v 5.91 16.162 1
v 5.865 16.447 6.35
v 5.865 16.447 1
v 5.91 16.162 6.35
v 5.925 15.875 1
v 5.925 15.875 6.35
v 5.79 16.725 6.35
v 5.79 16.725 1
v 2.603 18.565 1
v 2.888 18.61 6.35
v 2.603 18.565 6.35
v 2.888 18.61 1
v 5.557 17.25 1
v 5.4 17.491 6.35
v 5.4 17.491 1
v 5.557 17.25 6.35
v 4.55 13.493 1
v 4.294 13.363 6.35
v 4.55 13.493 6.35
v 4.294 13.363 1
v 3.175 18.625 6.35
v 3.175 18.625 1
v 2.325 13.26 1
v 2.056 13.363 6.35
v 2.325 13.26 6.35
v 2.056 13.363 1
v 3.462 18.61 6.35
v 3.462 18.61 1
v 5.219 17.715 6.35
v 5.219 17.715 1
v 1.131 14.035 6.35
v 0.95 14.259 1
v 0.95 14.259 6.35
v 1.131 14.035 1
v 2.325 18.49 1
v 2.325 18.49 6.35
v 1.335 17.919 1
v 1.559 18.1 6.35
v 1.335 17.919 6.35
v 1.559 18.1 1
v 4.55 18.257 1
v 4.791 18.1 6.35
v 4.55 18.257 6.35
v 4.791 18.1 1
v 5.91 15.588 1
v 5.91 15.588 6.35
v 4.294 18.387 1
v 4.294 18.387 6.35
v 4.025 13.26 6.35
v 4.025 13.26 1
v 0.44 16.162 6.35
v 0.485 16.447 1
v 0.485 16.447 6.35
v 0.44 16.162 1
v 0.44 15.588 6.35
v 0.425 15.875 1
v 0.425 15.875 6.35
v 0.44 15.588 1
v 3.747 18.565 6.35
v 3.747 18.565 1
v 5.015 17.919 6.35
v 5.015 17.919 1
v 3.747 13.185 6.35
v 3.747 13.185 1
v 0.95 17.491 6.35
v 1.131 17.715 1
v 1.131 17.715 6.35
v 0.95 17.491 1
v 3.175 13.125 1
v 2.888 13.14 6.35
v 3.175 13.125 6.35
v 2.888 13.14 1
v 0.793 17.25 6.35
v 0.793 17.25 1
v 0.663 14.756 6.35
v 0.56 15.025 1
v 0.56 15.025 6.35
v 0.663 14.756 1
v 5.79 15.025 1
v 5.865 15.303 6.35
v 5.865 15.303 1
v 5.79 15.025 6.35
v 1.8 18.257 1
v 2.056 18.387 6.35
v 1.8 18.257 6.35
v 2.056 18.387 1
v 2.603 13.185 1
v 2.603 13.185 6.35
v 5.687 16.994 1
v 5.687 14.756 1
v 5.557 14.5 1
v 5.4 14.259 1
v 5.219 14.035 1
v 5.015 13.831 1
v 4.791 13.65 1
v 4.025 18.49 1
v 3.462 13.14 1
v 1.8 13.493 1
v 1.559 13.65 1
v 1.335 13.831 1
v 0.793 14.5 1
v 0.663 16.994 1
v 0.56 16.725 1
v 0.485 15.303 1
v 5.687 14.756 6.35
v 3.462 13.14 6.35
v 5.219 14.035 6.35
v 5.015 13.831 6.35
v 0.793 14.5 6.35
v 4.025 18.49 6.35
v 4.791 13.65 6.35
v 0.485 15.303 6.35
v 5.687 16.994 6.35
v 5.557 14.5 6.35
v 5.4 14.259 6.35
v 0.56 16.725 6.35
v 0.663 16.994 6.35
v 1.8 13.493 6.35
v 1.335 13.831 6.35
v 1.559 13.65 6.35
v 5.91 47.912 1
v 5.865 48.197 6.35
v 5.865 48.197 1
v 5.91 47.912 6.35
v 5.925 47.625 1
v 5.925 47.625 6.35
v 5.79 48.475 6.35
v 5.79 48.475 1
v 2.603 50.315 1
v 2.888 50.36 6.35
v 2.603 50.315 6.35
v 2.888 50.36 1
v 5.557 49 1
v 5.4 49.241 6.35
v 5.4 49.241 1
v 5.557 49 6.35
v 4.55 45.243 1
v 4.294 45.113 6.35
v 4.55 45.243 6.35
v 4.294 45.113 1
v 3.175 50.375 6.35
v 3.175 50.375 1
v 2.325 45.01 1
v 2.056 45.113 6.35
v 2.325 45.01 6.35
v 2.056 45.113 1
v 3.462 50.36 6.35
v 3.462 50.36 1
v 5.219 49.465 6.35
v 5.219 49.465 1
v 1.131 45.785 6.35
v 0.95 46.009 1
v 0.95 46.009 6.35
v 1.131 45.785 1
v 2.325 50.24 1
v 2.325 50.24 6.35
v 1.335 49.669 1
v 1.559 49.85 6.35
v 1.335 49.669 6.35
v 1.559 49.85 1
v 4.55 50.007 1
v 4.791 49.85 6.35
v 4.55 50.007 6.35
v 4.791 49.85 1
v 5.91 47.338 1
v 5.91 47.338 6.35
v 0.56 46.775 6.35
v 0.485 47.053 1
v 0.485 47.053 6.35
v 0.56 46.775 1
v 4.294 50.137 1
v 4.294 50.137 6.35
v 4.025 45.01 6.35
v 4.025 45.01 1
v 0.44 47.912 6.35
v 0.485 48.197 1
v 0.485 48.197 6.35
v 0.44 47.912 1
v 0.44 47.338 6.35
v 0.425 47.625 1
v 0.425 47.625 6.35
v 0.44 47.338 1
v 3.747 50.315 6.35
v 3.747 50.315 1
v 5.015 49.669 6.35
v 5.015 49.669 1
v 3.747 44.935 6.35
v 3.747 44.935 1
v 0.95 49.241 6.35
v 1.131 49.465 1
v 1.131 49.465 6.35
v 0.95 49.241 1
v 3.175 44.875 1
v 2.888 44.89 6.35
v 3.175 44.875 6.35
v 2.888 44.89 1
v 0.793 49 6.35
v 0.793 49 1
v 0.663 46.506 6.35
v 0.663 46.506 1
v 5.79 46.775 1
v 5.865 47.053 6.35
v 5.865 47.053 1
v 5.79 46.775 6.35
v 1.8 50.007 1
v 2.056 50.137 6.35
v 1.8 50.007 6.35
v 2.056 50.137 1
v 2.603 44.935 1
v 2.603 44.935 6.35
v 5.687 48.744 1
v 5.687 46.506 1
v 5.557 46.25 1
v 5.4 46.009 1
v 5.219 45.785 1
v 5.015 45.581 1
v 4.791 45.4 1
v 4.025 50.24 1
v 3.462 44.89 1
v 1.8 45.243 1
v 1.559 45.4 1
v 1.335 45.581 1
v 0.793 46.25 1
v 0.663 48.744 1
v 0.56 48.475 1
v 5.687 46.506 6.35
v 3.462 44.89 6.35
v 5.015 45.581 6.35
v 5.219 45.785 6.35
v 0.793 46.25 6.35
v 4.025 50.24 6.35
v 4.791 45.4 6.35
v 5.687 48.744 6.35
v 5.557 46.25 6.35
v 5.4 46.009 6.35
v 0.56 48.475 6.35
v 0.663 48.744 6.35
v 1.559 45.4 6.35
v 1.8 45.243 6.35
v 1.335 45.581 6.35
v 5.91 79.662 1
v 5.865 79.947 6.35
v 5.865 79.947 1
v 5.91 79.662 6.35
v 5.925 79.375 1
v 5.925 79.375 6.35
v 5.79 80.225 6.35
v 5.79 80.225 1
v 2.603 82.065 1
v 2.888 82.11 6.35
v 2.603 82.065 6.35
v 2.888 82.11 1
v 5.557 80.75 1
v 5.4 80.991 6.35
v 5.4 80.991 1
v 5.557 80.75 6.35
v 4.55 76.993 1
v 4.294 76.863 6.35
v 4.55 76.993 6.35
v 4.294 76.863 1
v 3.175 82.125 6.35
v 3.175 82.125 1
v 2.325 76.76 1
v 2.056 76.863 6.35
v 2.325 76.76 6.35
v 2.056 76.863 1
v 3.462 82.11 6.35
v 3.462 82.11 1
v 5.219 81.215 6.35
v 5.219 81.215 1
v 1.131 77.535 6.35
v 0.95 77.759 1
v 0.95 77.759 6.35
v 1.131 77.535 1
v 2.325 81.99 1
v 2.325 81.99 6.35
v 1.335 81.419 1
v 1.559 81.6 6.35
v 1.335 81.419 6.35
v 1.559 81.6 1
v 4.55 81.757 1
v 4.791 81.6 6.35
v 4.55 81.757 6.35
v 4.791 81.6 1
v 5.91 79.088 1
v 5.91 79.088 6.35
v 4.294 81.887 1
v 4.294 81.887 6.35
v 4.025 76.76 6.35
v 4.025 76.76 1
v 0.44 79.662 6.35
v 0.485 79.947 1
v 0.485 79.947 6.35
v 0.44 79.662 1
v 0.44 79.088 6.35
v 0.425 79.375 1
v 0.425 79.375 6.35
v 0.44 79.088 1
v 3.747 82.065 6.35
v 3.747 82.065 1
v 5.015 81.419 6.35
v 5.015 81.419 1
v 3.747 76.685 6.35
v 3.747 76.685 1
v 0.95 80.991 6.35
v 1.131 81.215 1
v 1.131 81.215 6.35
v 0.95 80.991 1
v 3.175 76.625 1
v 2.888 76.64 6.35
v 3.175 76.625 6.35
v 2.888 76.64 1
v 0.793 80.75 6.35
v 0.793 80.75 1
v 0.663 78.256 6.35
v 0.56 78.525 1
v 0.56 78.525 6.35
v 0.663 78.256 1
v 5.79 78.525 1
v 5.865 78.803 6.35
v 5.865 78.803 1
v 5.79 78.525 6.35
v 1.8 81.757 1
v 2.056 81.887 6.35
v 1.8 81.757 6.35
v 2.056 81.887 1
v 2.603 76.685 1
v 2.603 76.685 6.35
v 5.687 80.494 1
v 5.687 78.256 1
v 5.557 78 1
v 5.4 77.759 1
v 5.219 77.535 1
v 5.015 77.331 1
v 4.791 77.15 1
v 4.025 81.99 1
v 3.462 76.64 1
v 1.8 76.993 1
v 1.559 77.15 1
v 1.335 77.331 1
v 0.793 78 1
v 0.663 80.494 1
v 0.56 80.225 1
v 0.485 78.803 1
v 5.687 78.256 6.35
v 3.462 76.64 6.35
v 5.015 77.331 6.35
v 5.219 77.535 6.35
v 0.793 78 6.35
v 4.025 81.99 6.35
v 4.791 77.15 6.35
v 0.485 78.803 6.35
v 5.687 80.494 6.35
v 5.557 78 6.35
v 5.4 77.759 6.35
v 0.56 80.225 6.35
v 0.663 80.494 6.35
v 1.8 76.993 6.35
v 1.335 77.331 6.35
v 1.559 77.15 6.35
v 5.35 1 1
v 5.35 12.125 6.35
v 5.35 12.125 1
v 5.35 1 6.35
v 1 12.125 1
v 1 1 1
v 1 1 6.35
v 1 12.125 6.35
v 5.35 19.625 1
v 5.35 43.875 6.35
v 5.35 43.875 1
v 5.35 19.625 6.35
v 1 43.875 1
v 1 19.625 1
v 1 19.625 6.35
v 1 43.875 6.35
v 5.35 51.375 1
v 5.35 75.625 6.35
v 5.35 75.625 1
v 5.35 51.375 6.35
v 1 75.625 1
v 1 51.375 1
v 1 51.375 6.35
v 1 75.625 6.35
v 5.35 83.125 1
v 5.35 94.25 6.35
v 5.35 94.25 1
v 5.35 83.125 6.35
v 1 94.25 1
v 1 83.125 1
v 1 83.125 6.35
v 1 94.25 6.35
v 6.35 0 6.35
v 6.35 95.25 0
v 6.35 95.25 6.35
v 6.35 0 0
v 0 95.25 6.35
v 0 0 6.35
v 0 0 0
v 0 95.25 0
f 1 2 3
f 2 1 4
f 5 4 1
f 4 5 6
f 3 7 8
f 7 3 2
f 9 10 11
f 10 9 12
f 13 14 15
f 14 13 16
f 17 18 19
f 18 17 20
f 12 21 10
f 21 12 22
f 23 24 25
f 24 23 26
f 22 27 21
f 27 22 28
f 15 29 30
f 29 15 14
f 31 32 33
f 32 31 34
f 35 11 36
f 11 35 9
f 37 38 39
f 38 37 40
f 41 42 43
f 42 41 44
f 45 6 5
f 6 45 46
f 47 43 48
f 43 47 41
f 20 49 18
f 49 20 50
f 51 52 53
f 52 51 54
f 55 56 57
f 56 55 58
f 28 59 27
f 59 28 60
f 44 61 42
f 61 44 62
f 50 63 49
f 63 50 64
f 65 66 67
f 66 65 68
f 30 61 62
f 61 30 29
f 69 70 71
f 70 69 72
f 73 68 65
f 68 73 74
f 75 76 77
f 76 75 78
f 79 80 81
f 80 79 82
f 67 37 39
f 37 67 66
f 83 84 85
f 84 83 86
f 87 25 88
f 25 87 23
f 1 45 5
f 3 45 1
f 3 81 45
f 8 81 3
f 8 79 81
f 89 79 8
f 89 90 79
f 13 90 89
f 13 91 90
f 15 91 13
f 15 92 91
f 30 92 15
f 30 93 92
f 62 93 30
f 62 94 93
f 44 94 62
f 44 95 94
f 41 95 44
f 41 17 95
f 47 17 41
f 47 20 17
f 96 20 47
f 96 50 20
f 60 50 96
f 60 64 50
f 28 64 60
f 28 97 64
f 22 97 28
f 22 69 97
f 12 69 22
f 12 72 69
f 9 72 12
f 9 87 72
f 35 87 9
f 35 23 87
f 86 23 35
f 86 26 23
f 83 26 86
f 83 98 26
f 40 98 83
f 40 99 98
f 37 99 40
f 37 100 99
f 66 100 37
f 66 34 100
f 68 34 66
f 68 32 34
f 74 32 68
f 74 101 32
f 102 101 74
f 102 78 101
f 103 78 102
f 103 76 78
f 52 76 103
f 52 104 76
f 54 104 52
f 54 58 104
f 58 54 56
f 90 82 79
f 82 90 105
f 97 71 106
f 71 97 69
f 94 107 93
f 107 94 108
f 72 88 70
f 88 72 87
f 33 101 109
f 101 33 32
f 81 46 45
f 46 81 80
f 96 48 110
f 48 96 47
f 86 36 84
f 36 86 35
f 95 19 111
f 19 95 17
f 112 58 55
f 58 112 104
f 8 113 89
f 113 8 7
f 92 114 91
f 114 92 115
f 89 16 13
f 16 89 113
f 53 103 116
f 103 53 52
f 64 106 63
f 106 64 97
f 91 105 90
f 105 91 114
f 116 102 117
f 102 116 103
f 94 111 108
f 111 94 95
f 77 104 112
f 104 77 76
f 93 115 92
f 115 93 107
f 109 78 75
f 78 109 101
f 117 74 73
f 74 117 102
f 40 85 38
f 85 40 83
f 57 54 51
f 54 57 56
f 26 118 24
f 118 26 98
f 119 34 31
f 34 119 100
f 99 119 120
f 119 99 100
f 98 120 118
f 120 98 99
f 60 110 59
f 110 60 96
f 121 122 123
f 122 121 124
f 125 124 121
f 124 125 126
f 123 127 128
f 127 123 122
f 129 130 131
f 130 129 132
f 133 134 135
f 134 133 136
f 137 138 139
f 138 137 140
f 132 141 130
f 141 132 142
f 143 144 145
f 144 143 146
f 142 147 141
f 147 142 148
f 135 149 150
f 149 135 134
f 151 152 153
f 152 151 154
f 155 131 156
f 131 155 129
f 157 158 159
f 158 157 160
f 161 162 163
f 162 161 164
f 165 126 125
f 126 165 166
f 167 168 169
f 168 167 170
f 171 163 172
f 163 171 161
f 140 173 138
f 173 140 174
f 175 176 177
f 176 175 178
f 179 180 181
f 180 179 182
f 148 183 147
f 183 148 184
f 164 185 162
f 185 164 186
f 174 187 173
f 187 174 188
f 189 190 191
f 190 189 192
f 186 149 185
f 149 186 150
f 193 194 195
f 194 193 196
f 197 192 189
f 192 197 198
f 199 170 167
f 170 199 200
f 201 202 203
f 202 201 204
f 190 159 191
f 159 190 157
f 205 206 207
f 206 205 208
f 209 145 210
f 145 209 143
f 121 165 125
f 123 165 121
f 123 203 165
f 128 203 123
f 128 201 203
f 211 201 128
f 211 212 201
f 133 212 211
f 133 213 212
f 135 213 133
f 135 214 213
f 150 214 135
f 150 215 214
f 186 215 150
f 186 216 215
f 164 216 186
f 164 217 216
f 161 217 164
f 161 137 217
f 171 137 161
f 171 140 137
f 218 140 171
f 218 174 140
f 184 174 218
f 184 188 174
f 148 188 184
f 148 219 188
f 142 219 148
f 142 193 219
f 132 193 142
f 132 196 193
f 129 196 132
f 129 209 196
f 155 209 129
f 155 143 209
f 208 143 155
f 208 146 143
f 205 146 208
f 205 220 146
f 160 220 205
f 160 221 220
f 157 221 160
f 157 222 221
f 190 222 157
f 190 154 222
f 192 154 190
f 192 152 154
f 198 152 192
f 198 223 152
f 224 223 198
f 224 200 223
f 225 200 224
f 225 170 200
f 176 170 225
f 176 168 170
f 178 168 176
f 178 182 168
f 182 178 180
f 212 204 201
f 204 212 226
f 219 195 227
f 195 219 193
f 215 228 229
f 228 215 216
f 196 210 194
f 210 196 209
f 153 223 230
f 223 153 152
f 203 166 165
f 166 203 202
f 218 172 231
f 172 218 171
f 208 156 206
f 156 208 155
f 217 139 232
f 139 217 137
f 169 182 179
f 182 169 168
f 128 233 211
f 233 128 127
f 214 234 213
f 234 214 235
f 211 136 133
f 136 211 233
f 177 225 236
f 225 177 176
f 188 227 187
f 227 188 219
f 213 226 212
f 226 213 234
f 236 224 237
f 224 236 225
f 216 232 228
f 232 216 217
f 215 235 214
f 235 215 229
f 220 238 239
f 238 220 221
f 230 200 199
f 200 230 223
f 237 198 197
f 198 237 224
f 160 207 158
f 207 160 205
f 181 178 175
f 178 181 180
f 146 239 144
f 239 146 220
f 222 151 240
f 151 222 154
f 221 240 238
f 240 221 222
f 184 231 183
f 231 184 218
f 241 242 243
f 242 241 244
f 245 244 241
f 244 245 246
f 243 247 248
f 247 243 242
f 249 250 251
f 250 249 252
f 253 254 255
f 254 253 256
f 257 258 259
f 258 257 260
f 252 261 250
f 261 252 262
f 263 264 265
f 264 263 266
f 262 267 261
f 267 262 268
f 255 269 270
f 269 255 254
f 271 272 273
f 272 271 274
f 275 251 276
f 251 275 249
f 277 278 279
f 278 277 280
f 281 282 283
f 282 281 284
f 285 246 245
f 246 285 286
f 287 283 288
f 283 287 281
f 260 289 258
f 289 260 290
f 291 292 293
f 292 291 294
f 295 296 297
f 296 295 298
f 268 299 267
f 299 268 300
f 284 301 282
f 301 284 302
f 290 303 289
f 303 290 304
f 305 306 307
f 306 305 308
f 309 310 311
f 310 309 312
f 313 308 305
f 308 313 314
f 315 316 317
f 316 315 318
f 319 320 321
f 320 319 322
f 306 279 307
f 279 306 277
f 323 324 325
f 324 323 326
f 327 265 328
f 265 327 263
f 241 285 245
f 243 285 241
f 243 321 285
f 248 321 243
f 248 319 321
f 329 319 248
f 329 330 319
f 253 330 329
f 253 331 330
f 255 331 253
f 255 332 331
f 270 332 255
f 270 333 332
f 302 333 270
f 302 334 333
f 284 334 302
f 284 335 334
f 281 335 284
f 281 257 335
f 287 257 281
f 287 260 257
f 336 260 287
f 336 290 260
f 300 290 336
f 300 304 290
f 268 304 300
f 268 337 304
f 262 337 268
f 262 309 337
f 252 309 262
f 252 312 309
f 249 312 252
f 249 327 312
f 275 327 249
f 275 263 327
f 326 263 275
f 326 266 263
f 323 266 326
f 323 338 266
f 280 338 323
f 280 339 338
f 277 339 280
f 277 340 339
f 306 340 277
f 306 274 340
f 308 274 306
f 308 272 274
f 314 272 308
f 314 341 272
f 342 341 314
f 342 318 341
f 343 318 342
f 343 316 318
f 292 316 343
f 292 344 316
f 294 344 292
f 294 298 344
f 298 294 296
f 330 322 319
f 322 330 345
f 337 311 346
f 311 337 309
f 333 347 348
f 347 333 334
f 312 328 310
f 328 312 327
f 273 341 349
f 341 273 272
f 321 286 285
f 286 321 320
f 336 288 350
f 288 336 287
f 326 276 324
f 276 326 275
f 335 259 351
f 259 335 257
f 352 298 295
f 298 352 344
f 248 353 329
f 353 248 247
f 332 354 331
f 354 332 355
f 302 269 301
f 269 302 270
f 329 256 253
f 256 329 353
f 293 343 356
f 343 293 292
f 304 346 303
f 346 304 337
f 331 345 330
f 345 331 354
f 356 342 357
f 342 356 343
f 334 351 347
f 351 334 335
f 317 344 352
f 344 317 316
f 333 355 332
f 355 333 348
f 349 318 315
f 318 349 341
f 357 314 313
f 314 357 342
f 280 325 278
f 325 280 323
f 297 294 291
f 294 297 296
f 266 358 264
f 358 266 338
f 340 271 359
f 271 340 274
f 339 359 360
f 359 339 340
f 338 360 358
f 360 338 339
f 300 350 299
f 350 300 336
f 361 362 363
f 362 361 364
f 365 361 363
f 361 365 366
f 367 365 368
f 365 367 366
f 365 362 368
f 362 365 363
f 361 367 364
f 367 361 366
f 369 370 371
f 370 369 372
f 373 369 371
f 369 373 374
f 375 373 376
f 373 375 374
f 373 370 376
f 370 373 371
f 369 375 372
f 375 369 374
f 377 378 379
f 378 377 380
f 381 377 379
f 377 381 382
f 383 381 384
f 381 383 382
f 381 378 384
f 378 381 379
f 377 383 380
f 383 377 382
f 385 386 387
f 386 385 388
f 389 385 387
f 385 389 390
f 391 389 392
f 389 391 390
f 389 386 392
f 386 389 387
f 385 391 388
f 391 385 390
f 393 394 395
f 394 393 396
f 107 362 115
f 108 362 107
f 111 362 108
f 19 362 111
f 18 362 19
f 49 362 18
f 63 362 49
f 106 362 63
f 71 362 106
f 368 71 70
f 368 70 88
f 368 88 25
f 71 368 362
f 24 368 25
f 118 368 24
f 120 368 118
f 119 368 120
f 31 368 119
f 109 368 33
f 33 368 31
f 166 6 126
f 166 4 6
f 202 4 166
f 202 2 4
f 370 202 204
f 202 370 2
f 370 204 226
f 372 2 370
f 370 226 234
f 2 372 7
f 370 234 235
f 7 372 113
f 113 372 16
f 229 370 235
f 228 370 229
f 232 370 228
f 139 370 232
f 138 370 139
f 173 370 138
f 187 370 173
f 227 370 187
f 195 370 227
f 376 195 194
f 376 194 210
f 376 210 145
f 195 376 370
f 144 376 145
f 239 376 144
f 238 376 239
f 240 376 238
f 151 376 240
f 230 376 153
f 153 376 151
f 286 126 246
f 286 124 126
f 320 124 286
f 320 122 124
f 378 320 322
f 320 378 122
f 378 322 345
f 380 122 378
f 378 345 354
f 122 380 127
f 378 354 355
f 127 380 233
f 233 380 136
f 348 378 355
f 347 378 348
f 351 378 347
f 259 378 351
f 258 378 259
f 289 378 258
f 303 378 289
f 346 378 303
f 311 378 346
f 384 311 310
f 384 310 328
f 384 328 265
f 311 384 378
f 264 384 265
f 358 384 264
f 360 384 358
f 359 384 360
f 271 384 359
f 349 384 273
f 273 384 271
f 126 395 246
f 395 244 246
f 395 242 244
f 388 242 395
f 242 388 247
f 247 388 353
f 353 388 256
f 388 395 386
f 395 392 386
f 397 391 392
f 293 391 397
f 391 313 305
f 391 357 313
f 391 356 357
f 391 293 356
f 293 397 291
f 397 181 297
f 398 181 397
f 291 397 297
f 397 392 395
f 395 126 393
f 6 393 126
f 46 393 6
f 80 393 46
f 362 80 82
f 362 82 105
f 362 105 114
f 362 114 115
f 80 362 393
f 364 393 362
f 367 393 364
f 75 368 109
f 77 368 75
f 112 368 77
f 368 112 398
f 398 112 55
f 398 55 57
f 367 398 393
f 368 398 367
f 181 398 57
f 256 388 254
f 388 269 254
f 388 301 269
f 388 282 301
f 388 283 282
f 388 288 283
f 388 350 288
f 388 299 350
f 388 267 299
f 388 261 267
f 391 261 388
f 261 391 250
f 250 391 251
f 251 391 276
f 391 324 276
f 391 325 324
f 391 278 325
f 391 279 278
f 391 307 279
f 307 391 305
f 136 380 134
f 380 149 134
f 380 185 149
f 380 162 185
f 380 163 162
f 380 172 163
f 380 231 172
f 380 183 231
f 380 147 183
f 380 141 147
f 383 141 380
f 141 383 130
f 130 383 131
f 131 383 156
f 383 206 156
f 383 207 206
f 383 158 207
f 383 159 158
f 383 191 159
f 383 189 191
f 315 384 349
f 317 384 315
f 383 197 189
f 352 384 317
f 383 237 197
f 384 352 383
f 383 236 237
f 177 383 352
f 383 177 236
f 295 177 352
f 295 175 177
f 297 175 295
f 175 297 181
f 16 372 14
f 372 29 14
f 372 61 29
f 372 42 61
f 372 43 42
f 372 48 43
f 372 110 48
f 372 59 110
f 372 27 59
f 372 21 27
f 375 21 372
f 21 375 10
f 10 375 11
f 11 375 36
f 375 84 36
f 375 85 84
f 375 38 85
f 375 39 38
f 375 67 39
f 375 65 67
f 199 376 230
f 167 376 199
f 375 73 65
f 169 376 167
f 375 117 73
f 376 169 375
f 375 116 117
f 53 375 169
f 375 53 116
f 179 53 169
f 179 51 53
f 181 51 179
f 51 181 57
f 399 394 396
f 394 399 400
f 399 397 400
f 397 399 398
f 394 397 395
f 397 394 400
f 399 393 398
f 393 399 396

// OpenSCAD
// Number of faces
$fn=60;

// Inch to mm, makes it easier to read than 19.05mm == 0.75in
inch = 25.4;



// Magnet hole diameter
magnet_diameter = 5.5;

// Tile dimensions (TT=1.25, OpenLock=1)
tile_size = 1.25*inch;

// Length of the strip in tiles
tile_count = 3;

// Strip width (TT assumes 0.25in walls)
strip_width = 0.25*inch;

// Strip Height
strip_height = 0.25*inch;

// How much space to leave at the bottom of the magnet hole
magnet_hole_bottom_offset = 1;

// Whether to hollow the strip as much as possible
hollow = true;

// x y z

difference(){
    cube([strip_width, tile_size * tile_count, strip_height]);
    for (i = [0:tile_count-1]) {
        translate([0.5*strip_width, i*tile_size + 0.5*tile_size, magnet_hole_bottom_offset]) cylinder(h=strip_height, d=magnet_diameter);
    }
    if (hollow) {
        for (i = [0:tile_count]) {
            // Translation is based on: -1mm for the translation we did compare to the base object, 0.5*tile size for where the holes are, and some spacing for the holes
            // The first and last subtraction are half size
            first_hole_offset = 0.5*tile_size + 0.5*magnet_diameter +1;
            if (i==0) {
                translate([1, i*tile_size+1, 1]) cube([strip_width-2, (tile_size*0.5)-(0.5*magnet_diameter)-2, strip_height]);
            } else if (i==tile_count) {
                translate([1, first_hole_offset + (i-1)*tile_size, 1]) cube([strip_width-2, (tile_size-magnet_diameter)*0.5-2, strip_height*2]);
            } else {
                translate([1, first_hole_offset + (i-1)*tile_size, 1]) cube([strip_width-2, tile_size-magnet_diameter-2, strip_height*2]);
            }
        }
    }

}
